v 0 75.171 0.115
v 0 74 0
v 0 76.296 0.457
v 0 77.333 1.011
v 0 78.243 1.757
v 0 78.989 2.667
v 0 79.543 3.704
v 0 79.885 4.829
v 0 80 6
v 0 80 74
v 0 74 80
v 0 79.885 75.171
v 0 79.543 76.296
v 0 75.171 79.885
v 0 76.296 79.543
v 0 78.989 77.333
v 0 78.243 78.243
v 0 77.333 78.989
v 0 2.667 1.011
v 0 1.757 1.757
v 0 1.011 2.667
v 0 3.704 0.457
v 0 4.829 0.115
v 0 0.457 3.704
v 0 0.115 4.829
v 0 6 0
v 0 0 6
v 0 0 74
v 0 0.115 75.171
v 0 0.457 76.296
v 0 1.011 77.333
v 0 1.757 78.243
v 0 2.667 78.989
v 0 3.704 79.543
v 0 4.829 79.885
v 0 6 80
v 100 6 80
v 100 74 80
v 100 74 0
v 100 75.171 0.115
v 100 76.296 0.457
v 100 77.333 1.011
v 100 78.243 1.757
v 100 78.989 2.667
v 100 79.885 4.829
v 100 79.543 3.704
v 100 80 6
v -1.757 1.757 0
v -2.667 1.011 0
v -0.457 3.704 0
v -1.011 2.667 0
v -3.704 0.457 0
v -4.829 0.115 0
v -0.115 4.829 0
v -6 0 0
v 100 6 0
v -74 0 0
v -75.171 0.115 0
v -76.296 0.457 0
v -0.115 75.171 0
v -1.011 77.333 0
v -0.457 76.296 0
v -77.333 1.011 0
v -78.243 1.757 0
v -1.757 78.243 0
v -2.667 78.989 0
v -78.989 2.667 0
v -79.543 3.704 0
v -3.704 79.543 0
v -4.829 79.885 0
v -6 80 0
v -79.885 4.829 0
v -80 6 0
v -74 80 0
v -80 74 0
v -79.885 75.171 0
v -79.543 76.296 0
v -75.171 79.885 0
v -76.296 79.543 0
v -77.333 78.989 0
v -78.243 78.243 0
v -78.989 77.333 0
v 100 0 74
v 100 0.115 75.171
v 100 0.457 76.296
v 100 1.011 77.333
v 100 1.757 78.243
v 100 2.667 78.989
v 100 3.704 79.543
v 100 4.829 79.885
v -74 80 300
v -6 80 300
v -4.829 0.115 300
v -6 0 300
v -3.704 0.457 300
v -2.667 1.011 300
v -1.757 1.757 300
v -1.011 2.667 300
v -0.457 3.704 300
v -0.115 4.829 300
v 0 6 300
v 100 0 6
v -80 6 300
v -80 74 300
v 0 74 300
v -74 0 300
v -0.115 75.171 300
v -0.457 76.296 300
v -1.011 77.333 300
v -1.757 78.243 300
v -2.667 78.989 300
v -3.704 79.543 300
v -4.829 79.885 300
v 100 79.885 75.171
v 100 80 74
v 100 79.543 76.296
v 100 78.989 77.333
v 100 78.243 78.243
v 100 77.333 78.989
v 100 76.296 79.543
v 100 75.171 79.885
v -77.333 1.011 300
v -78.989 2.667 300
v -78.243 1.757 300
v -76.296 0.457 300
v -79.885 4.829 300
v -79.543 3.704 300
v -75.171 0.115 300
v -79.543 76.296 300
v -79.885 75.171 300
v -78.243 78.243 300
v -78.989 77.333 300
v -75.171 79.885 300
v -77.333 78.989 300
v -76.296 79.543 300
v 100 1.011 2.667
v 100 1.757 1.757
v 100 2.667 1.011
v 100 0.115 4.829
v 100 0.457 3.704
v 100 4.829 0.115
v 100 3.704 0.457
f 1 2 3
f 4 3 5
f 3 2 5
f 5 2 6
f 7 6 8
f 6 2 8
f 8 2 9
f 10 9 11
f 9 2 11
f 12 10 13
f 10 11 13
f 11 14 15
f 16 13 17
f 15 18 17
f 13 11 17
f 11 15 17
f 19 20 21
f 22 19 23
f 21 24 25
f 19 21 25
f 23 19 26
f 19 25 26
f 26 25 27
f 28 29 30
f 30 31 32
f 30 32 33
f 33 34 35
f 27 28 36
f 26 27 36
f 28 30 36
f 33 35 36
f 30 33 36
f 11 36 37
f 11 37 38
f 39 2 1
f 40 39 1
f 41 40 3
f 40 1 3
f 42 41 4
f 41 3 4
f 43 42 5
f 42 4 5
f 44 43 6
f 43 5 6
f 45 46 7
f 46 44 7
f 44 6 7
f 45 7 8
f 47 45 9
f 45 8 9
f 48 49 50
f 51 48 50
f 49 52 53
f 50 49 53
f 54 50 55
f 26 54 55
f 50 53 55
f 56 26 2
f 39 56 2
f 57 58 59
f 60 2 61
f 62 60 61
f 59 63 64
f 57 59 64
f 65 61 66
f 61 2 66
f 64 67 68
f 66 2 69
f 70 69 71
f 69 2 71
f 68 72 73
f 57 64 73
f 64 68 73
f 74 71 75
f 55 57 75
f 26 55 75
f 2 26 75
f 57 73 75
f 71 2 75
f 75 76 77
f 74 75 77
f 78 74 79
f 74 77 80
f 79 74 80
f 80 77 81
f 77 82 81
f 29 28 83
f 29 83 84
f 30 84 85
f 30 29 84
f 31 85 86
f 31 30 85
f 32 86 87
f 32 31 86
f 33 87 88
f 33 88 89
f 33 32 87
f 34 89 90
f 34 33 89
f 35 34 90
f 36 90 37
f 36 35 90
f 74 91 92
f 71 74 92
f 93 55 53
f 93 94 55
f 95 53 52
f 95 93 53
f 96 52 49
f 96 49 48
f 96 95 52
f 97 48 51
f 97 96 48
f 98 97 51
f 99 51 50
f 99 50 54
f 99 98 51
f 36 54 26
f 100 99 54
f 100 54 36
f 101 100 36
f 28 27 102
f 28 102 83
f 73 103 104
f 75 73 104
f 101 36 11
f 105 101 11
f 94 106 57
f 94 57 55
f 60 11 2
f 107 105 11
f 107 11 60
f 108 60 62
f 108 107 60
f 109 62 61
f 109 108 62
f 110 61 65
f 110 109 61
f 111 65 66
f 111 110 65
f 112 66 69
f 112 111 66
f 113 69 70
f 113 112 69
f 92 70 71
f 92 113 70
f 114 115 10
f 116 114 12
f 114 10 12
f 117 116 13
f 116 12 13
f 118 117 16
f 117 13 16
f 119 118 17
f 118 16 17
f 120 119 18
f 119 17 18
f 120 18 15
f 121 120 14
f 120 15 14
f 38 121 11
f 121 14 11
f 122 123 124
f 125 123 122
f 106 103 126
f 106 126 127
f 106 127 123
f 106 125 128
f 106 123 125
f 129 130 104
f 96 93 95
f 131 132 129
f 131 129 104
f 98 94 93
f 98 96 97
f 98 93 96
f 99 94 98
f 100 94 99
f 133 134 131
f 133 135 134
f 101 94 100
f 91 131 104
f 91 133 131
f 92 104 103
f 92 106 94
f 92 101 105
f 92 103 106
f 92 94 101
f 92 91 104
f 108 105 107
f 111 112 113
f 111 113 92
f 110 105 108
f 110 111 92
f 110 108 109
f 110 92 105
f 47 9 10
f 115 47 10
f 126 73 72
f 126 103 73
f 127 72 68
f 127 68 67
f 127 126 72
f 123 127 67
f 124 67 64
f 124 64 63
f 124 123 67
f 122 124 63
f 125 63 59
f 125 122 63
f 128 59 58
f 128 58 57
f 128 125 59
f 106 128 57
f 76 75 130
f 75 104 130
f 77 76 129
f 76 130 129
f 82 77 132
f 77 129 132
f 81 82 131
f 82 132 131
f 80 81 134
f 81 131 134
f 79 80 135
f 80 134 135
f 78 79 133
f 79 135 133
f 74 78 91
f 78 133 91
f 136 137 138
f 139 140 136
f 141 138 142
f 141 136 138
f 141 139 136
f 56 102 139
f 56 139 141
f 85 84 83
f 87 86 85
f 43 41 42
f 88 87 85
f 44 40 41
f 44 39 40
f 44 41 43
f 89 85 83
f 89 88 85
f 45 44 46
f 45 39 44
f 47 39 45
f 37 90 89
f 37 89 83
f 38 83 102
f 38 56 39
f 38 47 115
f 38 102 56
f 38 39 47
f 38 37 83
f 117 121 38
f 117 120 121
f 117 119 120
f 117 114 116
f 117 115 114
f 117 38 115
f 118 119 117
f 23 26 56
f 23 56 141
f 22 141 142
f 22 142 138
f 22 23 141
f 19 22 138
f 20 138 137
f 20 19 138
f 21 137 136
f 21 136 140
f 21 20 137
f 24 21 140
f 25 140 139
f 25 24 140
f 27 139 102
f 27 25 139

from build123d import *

# Parameters (mm, degrees)
F0_W        = 80
F0_H        = 80
F1_DEPTH    = 300
F2_R        = 6
F3_W        = 80
F3_H        = 80
F4_DEPTH    = 100
F5_T1_DEPTH = 115


# Not quite as in the source:
# - a fillet or chamfer that OpenCascade refuses, or shapes differently, is made with other operations: its cross-section is extruded or revolved along the edge and cut away or added


with BuildPart() as f1:
    # F0 (on Top) → F1 (new body)
    with BuildSketch(Plane.XY):
        with Locations((-40, 40)):
            Rectangle(F0_W, F0_H)
    extrude(amount=F1_DEPTH)

    # F2
    f2_edges = [f1.edges().sort_by_distance(p)[0] for p in [
        (-80, 80, 150),
        (-80, 0, 150),
        (0, 0, 150),
        (0, 80, 150),
    ]]
    fillet(f2_edges, radius=F2_R)

    # F3 (on Right) → F4 (join)
    with BuildSketch(Plane.YZ):
        with Locations((40, 40)):
            Rectangle(F3_W, F3_H)
    extrude(amount=F4_DEPTH)

    # F5: fillet of radius 6 on 4 edges, made by hand

    # F5_s2 → F5_t1 (cut)
    with BuildSketch(Plane.YZ):
        with BuildLine():
            ThreePointArc((0, 74), (1.7573593129, 78.2426406871), (6, 80))
            Line((6, 80), (0, 80))
            Line((0, 80), (0, 74))
        make_face()
        with BuildLine():
            ThreePointArc((80, 74), (78.2426406871, 78.2426406871), (74, 80))
            Line((74, 80), (80, 80))
            Line((80, 80), (80, 74))
        make_face()
        with BuildLine():
            ThreePointArc((6, 0), (1.7573593129, 1.7573593129), (0, 6))
            Line((0, 6), (0, 0))
            Line((0, 0), (6, 0))
        make_face()
        with BuildLine():
            ThreePointArc((74, 0), (78.2426406871, 1.7573593129), (80, 6))
            Line((80, 6), (80, 0))
            Line((80, 0), (74, 0))
        make_face()
    extrude(amount=F5_T1_DEPTH, mode=Mode.SUBTRACT)


solid = f1.part
